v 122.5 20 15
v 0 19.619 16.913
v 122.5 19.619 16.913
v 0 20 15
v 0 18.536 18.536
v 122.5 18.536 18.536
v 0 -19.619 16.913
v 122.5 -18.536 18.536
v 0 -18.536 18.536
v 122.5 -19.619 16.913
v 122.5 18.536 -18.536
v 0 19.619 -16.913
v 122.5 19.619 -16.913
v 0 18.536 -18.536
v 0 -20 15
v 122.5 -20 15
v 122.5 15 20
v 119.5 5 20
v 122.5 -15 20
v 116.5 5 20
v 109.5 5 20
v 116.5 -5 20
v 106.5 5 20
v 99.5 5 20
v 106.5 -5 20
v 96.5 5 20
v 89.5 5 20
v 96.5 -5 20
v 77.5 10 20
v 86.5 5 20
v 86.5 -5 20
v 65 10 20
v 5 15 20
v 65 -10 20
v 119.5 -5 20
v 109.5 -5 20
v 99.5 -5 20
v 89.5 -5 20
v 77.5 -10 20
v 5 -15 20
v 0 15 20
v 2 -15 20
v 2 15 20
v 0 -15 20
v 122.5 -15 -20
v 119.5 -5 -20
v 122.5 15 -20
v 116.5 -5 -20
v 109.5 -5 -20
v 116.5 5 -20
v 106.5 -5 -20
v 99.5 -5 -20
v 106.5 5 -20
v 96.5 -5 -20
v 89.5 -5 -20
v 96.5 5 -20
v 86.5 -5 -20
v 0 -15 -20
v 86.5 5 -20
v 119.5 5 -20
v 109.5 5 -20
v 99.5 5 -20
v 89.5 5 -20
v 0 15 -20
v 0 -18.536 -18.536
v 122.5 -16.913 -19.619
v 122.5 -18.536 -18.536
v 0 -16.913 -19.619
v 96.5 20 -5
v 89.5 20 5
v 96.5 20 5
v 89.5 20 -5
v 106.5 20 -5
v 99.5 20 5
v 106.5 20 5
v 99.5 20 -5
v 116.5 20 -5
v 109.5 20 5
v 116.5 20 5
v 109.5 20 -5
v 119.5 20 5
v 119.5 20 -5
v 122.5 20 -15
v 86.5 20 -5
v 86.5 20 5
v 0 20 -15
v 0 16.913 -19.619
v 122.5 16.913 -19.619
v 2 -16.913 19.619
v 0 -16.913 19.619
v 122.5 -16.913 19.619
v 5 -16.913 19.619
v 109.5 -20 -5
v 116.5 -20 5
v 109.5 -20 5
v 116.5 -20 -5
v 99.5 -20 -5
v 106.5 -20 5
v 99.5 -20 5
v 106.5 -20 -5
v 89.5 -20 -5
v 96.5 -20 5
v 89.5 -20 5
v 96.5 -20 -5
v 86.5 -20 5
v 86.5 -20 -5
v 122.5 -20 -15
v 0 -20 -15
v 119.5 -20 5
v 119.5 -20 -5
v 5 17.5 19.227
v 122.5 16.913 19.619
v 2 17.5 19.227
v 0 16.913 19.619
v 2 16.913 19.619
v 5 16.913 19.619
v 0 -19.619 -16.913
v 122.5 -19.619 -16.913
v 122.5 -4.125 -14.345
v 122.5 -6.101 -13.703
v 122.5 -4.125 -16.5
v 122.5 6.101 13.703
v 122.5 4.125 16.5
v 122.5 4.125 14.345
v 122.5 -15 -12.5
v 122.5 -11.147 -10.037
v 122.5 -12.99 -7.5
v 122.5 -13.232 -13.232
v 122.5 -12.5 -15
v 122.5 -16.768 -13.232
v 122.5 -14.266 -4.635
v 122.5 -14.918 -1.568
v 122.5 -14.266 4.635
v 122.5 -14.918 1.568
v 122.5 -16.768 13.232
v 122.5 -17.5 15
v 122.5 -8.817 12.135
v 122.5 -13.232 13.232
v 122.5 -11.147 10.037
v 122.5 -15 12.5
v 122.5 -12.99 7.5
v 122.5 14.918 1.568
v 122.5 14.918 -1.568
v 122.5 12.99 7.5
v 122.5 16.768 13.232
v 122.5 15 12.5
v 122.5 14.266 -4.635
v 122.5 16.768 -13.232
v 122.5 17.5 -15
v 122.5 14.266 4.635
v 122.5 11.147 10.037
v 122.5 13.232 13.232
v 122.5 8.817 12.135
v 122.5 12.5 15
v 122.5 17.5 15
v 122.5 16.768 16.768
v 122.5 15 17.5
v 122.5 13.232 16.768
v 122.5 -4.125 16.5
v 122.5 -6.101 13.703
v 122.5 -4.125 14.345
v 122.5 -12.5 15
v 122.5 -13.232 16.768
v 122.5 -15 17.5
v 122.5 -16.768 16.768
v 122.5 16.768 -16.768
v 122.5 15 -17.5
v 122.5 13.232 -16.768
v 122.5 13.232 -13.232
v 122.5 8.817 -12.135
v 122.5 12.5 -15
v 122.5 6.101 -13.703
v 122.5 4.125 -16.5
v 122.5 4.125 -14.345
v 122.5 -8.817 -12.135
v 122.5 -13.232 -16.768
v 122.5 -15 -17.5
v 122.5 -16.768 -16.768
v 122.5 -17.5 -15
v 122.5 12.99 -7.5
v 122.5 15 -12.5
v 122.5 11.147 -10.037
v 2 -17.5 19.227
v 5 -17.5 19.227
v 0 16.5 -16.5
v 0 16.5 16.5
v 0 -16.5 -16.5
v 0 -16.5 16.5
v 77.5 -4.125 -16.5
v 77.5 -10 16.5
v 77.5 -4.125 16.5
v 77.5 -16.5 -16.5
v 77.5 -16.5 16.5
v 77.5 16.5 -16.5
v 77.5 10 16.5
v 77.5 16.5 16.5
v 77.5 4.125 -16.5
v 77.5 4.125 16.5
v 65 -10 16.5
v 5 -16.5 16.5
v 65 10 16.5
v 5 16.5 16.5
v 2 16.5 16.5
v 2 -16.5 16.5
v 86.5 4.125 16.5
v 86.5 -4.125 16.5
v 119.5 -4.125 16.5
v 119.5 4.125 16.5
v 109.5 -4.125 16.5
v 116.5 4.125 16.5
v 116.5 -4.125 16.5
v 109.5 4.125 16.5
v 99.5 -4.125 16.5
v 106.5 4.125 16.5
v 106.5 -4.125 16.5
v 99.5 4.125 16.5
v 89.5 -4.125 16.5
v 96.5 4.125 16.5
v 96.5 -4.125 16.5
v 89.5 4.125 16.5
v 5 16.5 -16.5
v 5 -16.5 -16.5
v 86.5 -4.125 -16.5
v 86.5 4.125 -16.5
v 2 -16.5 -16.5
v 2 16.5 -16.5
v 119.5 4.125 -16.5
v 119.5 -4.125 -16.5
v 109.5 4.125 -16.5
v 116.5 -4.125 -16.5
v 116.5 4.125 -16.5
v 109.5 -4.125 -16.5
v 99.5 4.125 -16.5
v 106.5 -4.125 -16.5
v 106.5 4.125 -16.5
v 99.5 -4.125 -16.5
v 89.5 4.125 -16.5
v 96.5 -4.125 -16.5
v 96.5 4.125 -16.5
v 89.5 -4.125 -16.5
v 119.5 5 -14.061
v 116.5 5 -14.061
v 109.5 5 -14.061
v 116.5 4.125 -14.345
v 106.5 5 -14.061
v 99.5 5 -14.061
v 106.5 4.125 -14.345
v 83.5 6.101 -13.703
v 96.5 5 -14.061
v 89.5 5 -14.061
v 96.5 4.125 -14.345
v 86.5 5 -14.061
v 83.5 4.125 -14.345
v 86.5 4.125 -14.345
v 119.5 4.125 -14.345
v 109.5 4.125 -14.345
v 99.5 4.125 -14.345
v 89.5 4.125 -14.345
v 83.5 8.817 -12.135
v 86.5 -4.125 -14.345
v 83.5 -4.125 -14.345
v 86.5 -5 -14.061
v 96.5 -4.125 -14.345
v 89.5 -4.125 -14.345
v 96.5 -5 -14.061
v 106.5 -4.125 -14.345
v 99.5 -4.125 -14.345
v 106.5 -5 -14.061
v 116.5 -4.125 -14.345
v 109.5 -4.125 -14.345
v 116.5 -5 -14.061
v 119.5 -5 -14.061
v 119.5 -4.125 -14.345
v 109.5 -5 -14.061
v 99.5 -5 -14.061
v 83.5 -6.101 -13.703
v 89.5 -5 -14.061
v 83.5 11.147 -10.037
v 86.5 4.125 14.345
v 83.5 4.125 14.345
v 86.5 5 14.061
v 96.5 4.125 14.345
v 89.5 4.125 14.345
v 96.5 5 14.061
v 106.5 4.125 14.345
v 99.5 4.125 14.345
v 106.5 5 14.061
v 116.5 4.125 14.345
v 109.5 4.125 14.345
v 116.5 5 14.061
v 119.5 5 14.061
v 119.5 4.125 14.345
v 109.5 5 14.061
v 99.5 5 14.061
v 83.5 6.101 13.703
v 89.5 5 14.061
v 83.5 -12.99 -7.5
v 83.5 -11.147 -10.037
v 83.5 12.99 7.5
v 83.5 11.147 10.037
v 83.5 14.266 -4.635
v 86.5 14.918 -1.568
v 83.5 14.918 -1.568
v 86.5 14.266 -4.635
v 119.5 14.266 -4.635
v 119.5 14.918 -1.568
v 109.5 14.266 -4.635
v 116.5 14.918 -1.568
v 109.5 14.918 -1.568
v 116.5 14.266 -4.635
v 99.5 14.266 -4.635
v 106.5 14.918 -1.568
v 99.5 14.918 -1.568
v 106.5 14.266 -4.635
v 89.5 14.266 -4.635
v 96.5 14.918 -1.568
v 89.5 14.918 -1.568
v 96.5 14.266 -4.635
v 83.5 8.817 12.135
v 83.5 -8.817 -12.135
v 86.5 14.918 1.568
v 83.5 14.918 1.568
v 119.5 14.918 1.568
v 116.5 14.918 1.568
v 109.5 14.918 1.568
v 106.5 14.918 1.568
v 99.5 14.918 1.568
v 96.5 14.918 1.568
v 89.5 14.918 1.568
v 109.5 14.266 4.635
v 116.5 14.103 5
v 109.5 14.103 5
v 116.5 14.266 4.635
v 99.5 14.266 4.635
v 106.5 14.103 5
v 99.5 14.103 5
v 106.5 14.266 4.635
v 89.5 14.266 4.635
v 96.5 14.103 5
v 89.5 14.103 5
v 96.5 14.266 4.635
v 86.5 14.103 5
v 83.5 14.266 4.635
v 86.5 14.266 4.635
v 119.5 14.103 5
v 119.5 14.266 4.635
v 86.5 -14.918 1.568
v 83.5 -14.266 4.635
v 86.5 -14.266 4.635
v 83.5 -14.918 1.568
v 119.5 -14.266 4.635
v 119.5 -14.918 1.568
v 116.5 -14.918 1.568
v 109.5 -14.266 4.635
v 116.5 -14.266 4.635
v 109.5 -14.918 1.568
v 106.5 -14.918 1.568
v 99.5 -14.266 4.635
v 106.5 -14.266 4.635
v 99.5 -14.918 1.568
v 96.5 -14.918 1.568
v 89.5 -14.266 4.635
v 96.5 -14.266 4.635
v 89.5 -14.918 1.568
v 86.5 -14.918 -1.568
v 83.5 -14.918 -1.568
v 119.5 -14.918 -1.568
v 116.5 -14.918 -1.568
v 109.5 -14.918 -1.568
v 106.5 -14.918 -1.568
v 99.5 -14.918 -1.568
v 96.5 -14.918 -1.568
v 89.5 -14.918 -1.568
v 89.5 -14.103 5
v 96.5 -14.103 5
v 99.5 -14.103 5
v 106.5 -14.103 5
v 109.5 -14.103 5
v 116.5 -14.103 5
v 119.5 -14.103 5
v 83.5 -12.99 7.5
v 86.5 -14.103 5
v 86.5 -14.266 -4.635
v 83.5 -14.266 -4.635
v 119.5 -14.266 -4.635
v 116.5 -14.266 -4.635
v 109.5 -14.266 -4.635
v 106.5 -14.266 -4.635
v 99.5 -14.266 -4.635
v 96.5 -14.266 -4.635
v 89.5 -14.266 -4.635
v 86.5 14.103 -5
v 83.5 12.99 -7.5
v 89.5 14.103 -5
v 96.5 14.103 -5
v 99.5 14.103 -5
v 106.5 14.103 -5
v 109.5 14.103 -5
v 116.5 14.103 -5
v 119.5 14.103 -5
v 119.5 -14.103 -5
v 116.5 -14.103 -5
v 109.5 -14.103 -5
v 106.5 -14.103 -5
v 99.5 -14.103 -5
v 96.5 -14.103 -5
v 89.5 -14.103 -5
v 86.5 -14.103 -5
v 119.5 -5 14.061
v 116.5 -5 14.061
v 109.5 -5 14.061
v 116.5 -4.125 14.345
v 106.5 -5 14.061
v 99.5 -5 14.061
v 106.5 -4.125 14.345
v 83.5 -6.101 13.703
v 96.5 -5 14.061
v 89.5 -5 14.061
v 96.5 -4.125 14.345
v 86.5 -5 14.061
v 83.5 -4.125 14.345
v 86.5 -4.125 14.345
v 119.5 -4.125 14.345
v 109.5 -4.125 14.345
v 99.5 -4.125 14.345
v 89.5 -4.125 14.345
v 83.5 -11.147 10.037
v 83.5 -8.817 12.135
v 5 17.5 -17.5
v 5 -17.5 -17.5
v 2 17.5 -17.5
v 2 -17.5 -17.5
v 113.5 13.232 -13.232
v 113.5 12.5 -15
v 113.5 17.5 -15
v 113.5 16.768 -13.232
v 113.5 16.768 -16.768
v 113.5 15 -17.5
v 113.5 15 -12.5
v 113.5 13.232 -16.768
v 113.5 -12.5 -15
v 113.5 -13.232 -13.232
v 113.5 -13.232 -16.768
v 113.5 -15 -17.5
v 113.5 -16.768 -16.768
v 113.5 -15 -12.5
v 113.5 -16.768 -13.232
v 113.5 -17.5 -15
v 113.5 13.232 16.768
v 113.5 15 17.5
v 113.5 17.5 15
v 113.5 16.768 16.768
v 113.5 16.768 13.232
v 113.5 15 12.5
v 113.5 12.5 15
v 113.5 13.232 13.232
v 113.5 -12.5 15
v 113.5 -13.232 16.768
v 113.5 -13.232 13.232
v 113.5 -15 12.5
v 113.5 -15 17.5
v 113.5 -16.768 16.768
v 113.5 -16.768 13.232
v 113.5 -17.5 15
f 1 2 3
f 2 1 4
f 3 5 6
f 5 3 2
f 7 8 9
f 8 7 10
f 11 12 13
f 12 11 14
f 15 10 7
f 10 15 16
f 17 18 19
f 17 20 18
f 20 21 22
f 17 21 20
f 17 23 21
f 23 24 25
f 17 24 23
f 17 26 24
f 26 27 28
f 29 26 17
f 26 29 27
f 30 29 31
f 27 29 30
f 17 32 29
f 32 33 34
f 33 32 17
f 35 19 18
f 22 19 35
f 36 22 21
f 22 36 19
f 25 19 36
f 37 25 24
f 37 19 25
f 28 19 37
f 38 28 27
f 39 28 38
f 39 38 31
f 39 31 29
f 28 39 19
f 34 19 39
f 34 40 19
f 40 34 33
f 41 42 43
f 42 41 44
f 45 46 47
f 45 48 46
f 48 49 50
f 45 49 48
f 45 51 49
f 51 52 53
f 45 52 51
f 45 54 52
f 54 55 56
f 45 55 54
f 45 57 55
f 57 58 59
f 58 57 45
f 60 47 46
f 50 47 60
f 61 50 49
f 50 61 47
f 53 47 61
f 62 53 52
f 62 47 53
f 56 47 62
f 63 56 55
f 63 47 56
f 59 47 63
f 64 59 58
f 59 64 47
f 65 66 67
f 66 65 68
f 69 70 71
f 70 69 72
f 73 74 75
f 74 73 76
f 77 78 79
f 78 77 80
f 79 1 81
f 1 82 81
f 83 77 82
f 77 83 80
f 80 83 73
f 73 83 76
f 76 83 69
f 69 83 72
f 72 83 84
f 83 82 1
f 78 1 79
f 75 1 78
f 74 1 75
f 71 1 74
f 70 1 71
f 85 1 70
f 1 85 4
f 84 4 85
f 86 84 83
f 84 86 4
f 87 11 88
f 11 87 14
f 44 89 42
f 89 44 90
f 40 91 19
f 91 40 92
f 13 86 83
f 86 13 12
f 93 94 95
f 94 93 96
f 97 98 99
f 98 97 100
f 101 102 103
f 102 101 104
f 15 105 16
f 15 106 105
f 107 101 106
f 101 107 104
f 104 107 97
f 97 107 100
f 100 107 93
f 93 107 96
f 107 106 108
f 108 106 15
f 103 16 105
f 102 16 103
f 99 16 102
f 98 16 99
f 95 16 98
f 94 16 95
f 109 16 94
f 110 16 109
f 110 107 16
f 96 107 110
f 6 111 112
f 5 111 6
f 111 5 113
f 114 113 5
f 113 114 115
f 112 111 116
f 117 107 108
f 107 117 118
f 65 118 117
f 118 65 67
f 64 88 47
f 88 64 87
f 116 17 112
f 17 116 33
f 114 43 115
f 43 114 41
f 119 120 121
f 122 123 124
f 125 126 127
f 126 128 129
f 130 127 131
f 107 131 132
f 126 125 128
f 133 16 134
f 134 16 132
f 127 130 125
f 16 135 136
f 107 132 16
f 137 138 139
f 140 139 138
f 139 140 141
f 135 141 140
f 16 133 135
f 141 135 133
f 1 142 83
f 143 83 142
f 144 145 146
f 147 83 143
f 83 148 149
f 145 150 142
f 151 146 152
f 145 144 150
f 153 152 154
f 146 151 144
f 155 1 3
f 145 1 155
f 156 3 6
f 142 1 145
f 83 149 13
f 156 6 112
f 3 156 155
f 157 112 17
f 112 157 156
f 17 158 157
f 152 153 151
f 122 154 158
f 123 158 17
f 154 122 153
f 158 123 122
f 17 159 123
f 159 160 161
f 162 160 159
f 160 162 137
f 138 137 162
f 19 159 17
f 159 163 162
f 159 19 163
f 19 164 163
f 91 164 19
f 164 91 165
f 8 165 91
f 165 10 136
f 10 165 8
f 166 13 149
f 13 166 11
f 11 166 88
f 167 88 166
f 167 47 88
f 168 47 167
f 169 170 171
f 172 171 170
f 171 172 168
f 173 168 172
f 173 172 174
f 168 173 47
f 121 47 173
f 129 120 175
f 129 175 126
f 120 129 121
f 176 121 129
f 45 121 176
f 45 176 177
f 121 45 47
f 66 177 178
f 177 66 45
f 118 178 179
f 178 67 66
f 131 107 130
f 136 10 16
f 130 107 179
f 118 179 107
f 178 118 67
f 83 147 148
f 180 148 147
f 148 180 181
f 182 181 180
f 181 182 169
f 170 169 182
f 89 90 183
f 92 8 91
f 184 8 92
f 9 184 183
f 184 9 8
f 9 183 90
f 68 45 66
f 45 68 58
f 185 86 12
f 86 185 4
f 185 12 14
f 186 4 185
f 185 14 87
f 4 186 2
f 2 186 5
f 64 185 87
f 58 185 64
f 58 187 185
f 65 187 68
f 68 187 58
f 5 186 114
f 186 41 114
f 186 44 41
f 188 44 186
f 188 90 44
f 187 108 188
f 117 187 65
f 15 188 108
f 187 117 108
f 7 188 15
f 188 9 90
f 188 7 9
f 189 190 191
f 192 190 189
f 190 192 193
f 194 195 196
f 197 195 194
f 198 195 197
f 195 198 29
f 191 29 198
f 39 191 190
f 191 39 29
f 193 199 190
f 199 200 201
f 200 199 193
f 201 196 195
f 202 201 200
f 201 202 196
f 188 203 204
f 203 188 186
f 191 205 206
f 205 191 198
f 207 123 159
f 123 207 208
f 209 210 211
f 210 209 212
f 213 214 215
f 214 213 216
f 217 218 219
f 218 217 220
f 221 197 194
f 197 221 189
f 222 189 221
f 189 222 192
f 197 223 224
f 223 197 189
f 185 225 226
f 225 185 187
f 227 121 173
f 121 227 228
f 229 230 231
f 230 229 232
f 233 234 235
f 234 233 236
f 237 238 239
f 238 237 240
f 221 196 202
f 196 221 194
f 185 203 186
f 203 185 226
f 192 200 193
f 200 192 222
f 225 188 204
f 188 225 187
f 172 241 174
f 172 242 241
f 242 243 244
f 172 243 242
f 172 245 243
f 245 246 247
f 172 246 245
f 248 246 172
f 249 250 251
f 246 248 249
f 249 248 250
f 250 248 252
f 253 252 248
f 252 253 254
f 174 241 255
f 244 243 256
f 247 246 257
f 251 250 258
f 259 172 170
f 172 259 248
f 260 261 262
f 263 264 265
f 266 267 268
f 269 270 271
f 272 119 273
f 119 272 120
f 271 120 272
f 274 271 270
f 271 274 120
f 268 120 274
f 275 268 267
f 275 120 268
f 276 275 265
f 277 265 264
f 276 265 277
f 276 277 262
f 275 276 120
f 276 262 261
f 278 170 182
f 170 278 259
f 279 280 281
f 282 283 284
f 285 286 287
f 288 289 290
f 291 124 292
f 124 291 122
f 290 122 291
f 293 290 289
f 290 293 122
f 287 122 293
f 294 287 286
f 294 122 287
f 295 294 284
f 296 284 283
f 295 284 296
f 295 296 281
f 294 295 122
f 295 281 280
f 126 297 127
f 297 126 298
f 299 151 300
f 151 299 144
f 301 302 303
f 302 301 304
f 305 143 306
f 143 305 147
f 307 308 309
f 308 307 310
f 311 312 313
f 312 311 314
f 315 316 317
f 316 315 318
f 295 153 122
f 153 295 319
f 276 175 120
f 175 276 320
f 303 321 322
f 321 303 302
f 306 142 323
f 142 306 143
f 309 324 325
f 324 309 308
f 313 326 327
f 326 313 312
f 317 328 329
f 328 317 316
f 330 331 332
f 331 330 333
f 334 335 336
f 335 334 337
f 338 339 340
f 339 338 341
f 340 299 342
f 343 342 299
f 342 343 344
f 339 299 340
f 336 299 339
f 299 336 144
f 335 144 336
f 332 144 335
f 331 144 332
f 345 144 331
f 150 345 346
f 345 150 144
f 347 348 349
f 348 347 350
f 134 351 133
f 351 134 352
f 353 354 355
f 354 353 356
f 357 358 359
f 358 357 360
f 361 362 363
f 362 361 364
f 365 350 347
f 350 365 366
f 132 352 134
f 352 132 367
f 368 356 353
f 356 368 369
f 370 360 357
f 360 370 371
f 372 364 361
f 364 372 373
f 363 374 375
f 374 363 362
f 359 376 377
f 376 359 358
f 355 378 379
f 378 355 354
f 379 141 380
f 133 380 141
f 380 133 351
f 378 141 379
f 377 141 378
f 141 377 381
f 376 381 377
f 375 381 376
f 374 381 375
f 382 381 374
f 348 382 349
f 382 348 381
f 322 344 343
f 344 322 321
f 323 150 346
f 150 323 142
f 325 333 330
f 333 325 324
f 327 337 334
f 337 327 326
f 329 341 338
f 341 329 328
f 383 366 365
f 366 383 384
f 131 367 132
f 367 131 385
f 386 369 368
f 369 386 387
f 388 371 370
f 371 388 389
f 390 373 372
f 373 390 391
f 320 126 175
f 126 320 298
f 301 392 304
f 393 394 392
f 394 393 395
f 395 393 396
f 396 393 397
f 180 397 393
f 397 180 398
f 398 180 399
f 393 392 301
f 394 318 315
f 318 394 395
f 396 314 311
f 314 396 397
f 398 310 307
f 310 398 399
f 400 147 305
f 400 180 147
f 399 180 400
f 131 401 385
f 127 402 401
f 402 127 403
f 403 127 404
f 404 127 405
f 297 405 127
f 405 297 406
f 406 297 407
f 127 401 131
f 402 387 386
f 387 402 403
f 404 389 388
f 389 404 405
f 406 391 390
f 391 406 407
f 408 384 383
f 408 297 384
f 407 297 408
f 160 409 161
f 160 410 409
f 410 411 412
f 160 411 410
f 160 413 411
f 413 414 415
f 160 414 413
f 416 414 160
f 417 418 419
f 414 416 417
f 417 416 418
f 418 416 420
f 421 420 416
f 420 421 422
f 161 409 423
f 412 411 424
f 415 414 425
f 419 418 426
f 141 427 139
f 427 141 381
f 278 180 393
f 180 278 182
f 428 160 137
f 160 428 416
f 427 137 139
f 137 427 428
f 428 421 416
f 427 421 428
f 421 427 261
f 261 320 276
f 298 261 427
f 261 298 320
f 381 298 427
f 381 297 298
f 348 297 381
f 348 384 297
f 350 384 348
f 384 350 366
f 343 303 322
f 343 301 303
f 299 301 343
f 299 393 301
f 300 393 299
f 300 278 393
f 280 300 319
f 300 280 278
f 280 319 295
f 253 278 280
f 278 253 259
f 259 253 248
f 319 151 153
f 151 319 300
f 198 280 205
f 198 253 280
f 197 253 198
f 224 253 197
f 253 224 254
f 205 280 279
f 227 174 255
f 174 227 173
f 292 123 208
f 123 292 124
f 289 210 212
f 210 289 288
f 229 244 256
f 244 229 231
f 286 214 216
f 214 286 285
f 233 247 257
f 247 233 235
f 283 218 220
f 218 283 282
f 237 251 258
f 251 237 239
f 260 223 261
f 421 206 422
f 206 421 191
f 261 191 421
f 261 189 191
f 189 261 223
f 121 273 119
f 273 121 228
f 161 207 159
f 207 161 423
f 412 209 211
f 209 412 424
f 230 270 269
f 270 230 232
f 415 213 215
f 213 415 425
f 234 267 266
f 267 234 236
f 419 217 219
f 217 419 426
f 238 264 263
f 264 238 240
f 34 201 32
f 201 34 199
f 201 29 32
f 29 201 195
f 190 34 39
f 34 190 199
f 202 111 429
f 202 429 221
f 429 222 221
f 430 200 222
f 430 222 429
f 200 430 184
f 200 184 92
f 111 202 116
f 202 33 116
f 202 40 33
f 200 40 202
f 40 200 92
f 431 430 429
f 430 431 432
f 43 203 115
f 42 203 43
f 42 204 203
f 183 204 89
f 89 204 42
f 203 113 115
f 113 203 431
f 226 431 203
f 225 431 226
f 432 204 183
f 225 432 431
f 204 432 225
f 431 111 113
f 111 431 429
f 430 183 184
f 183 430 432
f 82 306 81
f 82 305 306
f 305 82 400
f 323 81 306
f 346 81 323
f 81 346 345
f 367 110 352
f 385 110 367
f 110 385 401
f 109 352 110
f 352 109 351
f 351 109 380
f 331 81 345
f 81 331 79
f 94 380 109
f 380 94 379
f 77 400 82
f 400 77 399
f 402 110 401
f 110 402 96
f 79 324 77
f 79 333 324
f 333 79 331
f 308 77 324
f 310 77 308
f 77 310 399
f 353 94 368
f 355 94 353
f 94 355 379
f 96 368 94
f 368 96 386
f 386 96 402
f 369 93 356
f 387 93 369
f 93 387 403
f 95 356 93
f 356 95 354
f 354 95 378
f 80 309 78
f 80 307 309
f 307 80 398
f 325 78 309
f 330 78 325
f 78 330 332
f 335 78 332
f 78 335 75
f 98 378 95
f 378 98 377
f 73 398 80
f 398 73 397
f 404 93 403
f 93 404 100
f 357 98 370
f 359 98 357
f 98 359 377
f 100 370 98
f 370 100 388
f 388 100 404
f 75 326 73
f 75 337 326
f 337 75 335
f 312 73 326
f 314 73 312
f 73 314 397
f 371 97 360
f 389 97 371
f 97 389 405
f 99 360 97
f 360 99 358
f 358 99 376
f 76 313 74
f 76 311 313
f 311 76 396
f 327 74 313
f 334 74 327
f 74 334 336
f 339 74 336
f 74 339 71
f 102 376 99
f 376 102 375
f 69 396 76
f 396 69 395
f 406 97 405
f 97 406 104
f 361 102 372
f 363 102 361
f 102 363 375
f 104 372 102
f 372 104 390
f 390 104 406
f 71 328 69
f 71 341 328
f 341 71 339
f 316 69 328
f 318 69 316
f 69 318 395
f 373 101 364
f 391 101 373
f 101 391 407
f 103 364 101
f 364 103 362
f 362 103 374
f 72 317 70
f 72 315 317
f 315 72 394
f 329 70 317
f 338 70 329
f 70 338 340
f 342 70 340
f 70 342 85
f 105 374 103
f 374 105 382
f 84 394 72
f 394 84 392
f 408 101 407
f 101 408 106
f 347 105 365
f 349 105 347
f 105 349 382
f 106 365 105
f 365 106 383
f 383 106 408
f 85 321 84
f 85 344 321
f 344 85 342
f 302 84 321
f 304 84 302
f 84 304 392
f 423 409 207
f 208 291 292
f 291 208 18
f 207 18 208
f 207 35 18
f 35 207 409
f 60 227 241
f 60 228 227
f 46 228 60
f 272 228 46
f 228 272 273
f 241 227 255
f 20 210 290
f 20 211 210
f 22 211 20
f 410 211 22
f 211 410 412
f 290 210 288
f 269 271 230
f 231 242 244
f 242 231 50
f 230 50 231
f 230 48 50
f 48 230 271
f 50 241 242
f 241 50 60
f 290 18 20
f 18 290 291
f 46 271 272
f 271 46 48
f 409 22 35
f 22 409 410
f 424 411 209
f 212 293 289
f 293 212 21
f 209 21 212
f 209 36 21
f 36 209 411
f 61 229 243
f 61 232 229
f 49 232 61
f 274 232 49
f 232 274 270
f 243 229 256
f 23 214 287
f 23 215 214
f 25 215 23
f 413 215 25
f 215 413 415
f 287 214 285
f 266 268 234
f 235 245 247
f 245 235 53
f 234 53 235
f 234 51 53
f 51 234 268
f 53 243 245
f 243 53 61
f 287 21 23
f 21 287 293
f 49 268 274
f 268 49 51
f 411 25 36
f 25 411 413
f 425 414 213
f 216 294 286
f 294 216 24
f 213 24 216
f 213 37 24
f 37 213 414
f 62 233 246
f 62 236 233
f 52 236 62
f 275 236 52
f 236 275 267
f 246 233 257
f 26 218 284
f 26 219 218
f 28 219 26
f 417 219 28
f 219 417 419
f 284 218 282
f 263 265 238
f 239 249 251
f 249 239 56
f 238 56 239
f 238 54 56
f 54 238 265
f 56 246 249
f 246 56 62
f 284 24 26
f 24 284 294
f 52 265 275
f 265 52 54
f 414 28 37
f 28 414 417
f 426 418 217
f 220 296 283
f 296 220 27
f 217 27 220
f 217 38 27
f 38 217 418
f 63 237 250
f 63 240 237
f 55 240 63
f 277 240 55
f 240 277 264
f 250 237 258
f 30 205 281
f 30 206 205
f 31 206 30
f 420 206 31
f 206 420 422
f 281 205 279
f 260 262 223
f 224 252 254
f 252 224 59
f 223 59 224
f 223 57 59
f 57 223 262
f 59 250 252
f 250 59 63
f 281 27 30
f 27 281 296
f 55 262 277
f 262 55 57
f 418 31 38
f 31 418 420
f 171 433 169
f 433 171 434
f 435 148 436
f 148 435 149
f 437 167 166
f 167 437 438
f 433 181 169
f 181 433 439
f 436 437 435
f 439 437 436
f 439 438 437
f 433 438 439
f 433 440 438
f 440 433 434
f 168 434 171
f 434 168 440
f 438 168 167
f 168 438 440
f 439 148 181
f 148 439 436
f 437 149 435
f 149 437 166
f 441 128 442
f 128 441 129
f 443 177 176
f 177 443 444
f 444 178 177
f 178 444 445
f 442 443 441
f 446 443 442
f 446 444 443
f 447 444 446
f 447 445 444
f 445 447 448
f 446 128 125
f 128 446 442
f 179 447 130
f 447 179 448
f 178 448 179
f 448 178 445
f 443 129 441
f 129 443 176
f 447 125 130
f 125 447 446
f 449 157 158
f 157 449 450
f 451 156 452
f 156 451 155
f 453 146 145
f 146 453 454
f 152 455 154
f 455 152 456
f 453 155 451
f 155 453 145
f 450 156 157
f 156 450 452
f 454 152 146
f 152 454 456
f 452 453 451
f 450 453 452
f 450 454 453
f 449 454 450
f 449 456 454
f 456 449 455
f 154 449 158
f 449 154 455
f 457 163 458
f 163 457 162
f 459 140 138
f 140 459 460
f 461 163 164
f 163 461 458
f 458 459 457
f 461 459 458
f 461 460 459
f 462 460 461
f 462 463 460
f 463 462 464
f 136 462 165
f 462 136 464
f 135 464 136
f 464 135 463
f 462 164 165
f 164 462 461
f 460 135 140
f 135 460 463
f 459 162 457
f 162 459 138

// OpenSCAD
//How long is your motor (mm)?
depth_motor = 40;
//What is the diameter of your motor(mm)?
dia_motor = 30;

//What is the width of your switch(mm)?
width_button = 12.5;
//What is the length of your switch(mm)?
length_button = 20;

//What is the width of your battery holder(mm)?
width_battery = 33;
//What is the length of your battery holder(mm)?
length_battery = 33;
//What is the height of your battery holder (how long is it)(mm)?
depth_battery = 60;


overall_length = depth_battery+depth_motor+width_button+10;

difference(){

hull(){
rotate([0,90,0])translate([-15,-15,0])cylinder(r = 5, h = overall_length, center = false);
rotate([0,90,0])translate([+15,-15,0])cylinder(r = 5, h = overall_length, center = false);
rotate([0,90,0])translate([-15,+15,0])cylinder(r = 5, h = overall_length, center = false);
rotate([0,90,0])translate([+15,+15,0])cylinder(r = 5, h = overall_length, center = false);
}

//minus
translate([-1,-width_battery/2,-length_battery/2])cube([depth_battery+width_button+6,width_battery,length_battery]);

rotate([0,90,0])translate([0,0,overall_length-depth_motor+1])cylinder(r = dia_motor/2, h = depth_motor, center = false);

translate([depth_battery+5,-width_battery/8,-length_battery/2])cube([depth_battery+5,width_battery/4,length_battery]);

translate([depth_battery+5,-length_button/2,1])cube([width_button,length_button,20]);

translate([2,-17.5,-17.5])cube([3,35,40]);

translate([overall_length-6,-25,-5])cube([3,50,10]);
translate([overall_length-16,-25,-5])cube([3,50,10]);
translate([overall_length-26,-25,-5])cube([3,50,10]);
translate([overall_length-36,-25,-5])cube([3,50,10]);

translate([overall_length-6,-5,-25])cube([3,10,50]);
translate([overall_length-16,-5,-25])cube([3,10,50]);
translate([overall_length-26,-5,-25])cube([3,10,50]);
translate([overall_length-36,-5,-25])cube([3,10,50]);

rotate([0,90,0])translate([15,15,overall_length-9])cylinder(r = 2.5, h = 10, center = false);
rotate([0,90,0])translate([15,-15,overall_length-9])cylinder(r = 2.5, h = 10, center = false);
rotate([0,90,0])translate([-15,15,overall_length-9])cylinder(r = 2.5, h = 10, center = false);
rotate([0,90,0])translate([-15,-15,overall_length-9])cylinder(r = 2.5, h = 10, center = false);
}
